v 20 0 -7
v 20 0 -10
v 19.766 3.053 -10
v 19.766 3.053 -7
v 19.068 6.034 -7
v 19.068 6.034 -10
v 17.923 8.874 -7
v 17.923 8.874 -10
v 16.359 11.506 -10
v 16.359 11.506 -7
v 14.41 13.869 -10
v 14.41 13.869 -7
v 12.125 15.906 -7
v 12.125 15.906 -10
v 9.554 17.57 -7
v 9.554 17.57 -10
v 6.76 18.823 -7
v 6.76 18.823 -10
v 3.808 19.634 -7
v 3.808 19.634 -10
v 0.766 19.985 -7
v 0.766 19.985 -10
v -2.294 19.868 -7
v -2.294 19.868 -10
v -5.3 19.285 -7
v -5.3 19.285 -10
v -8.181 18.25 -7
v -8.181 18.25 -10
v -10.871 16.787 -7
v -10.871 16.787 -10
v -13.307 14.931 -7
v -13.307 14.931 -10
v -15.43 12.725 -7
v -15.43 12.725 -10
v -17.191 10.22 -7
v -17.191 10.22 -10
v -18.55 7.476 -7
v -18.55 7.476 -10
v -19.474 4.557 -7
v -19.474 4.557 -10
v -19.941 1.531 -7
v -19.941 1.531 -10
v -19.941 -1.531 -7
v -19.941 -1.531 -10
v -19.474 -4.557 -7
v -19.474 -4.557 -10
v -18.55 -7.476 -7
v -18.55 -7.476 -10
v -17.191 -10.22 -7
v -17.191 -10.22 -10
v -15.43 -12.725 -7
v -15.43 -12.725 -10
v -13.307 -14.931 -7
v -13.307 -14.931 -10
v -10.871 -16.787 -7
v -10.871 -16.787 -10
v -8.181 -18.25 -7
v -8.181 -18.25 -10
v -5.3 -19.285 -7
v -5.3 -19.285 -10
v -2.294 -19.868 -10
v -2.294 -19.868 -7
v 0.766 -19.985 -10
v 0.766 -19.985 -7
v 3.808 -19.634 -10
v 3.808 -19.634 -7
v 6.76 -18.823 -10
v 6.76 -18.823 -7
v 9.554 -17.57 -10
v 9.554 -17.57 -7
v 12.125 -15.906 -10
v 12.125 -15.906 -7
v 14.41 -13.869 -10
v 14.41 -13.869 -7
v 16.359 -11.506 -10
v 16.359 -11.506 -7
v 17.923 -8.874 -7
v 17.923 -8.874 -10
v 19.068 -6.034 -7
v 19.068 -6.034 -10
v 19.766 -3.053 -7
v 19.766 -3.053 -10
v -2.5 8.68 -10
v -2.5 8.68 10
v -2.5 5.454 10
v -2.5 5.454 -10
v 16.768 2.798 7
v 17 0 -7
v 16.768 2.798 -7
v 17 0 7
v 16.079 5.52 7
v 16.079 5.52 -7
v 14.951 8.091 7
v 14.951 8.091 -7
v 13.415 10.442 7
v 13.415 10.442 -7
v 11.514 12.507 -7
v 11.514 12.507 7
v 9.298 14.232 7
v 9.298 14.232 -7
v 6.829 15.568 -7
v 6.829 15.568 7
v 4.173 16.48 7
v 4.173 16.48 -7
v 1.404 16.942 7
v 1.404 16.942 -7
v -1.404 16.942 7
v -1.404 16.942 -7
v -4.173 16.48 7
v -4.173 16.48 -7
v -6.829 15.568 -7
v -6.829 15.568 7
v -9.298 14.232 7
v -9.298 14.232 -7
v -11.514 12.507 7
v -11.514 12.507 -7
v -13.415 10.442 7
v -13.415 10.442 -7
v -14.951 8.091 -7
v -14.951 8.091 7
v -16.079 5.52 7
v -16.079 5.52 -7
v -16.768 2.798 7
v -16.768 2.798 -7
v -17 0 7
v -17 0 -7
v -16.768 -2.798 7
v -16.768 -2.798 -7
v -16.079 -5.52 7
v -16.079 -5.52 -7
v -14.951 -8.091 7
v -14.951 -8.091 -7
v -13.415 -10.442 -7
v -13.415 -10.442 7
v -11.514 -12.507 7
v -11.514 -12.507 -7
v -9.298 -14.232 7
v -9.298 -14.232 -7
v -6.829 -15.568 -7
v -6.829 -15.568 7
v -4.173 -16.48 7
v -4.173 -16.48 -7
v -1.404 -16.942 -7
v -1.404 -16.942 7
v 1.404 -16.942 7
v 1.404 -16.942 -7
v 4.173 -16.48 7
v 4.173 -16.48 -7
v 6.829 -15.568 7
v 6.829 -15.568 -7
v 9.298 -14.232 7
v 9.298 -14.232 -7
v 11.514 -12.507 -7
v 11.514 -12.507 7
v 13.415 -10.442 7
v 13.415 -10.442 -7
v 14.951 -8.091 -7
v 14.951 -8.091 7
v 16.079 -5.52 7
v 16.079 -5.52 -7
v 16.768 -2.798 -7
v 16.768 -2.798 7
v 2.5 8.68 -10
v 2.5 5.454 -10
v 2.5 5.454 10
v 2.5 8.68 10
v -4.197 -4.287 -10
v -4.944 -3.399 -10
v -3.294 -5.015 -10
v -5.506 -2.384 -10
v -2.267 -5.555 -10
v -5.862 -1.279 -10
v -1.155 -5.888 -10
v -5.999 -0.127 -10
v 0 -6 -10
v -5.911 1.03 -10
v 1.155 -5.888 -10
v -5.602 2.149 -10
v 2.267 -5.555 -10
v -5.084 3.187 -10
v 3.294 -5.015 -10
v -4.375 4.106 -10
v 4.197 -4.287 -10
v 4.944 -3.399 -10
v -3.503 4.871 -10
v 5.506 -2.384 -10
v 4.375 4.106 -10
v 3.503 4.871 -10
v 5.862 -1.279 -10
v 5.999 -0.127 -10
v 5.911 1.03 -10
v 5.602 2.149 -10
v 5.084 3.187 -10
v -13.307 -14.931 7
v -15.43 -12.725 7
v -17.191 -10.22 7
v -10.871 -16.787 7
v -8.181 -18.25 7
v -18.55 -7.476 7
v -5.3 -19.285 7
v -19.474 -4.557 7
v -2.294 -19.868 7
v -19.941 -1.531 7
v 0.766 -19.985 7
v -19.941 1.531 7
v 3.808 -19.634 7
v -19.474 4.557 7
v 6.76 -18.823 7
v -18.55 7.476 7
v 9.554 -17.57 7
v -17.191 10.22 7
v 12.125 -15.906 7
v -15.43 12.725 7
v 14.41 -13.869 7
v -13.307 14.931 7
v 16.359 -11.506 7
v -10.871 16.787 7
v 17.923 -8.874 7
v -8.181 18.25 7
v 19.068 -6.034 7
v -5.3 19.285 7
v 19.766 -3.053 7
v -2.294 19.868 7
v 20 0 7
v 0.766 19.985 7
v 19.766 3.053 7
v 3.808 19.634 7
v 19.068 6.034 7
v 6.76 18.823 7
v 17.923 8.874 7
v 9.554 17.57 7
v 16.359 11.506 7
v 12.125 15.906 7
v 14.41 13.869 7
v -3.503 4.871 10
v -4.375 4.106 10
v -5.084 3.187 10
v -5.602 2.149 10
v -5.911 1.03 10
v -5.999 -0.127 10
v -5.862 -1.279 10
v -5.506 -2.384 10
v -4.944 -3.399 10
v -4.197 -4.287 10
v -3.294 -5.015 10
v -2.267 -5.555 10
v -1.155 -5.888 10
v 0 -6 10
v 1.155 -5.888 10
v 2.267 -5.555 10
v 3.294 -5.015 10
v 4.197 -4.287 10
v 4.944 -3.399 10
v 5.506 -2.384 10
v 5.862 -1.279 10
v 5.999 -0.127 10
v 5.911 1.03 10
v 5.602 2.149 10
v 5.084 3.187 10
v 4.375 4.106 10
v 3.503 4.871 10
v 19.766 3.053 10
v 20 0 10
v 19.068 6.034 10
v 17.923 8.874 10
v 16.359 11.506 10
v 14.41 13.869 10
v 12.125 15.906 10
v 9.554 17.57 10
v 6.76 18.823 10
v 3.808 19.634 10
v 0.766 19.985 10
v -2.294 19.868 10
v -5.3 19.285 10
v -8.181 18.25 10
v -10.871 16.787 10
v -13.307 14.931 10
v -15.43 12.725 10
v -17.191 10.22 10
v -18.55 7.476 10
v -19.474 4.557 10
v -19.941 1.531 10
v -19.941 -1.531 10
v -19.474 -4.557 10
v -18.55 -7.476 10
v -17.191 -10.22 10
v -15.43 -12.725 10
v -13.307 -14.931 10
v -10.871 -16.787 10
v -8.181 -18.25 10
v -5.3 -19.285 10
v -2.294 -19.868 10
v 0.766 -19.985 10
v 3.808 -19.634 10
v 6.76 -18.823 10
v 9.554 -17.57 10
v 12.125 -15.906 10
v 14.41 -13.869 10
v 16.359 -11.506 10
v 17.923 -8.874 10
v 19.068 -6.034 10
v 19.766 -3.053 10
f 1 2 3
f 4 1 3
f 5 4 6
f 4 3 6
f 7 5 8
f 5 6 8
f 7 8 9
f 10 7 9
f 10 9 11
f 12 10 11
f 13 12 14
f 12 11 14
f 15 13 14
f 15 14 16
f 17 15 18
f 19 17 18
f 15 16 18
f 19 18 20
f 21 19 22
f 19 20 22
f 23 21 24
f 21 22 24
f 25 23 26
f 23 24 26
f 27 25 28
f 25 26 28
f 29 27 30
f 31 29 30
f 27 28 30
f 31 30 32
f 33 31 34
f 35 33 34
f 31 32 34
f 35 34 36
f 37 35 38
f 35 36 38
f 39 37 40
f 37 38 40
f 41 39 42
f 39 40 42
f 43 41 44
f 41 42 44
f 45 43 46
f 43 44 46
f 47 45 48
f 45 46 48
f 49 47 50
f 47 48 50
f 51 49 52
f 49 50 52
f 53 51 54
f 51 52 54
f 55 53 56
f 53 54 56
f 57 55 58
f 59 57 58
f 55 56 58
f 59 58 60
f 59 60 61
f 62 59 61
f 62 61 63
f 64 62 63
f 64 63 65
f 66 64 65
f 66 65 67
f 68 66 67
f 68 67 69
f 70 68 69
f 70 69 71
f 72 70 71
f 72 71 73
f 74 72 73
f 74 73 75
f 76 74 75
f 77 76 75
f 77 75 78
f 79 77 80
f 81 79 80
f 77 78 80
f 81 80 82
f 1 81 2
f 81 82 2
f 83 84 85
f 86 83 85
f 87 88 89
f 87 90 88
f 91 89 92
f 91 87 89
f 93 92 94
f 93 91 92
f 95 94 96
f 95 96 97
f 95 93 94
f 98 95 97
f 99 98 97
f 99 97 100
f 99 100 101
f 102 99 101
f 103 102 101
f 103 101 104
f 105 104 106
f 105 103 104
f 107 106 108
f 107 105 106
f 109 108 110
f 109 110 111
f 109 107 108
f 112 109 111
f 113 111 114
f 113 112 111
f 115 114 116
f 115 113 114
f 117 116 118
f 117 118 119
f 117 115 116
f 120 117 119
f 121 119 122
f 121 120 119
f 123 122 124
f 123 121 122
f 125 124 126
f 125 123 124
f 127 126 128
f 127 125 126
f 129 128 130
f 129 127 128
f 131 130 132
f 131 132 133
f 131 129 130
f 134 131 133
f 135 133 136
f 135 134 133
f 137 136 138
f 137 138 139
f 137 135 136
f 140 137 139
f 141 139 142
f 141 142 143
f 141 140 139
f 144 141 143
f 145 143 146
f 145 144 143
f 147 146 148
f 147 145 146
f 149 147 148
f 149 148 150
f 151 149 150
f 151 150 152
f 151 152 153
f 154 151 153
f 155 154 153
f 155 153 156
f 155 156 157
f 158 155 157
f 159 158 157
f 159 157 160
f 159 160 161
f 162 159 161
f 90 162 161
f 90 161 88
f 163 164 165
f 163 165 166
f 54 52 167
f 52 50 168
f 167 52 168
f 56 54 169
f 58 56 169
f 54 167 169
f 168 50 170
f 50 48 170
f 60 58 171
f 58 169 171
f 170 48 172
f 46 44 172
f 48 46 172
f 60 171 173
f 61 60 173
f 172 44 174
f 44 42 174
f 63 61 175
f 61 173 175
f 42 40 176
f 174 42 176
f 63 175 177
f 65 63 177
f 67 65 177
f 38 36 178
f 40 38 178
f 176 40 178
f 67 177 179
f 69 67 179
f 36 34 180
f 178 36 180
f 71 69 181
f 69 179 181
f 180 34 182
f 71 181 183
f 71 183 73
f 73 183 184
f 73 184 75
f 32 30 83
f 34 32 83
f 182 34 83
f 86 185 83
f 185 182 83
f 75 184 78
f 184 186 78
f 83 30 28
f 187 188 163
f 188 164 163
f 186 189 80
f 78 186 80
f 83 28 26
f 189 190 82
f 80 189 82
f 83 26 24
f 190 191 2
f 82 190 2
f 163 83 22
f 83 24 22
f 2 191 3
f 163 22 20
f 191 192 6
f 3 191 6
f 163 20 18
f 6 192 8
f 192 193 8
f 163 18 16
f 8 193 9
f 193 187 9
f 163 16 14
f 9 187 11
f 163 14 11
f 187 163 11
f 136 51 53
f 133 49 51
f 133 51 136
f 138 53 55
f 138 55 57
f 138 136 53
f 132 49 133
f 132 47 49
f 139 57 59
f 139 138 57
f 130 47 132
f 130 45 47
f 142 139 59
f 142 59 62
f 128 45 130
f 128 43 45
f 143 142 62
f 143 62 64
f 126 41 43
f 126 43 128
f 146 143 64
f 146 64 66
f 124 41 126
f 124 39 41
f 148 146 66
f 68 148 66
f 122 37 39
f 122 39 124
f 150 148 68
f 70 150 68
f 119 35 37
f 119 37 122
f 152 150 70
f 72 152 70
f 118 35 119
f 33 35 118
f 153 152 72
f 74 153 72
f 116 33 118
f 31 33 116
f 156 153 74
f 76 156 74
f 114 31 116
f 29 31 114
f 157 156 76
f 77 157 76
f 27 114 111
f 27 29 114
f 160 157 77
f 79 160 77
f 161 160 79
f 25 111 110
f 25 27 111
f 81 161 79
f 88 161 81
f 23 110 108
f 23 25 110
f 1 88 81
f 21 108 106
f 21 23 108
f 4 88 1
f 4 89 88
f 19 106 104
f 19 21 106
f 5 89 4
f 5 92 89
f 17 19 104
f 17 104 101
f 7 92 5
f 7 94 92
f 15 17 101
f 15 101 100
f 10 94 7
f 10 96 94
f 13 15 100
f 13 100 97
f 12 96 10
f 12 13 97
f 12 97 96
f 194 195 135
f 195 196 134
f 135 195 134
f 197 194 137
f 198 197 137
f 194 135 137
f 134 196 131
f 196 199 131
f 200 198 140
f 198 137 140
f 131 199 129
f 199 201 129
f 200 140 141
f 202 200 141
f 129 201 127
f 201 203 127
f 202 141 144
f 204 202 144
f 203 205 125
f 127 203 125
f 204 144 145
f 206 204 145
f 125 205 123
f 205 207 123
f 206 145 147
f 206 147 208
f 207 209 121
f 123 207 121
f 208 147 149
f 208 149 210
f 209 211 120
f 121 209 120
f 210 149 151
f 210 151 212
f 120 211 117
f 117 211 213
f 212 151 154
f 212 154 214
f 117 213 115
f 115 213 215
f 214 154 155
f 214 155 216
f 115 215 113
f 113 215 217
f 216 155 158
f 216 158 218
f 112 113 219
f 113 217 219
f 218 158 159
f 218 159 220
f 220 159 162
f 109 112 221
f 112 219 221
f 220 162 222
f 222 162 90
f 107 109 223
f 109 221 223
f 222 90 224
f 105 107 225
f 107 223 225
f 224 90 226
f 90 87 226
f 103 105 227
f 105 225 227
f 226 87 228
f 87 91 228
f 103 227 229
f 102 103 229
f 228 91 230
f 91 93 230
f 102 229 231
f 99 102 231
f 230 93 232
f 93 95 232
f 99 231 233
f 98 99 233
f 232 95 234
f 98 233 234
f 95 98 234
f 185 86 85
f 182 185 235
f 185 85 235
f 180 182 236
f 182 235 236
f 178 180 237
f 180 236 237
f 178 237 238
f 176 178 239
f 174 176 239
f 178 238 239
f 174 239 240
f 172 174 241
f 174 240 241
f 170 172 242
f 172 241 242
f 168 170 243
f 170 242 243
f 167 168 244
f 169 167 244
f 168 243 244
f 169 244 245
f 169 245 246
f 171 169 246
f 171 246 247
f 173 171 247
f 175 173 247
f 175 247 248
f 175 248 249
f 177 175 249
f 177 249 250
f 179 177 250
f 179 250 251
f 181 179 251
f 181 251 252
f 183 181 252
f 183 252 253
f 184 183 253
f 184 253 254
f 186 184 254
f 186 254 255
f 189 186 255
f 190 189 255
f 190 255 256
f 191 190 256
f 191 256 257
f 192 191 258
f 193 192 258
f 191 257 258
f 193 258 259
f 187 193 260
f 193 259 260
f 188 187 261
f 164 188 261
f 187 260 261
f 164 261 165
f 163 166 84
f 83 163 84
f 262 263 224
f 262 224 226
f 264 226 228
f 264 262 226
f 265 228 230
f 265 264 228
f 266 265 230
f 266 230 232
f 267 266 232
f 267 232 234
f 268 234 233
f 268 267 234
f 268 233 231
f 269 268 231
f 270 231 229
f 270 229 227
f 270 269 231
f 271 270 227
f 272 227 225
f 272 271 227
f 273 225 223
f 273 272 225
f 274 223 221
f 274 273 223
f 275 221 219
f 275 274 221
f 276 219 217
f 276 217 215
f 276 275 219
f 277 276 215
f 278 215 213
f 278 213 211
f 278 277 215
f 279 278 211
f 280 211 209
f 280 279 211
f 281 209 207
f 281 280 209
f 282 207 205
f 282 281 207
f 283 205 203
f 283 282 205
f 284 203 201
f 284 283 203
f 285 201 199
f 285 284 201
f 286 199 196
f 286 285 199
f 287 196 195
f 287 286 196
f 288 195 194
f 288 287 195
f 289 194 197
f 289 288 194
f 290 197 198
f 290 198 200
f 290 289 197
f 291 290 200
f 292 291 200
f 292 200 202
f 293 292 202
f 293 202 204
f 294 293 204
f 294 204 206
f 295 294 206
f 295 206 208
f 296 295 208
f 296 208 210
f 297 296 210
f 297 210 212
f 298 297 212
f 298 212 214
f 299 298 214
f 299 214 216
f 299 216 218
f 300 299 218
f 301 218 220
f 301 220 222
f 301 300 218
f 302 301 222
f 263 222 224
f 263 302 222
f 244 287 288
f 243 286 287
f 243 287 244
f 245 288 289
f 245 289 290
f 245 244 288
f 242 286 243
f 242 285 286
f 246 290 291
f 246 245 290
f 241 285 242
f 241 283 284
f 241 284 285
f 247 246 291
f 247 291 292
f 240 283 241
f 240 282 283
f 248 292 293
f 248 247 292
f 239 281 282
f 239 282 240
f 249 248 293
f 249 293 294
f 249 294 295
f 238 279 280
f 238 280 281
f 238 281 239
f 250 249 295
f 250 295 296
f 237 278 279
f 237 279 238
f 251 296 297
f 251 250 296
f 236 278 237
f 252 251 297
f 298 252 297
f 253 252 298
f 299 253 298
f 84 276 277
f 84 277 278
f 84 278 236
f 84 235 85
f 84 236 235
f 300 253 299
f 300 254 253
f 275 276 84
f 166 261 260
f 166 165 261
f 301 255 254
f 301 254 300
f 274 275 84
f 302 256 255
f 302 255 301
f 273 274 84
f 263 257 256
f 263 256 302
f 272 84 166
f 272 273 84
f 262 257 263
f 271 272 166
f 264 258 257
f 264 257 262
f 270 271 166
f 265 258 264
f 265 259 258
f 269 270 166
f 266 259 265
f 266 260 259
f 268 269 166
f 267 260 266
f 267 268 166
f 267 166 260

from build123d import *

# Parameters (mm, degrees)
SKETCH_1_R          = 17
EXTRUDE_1_DEPTH     = 10
SKETCH_2_R          = 20
EXTRUDE_2_DEPTH     = 3
CUT_EXTRUDE_1_DEPTH = 35.641016151


with BuildPart() as part:
    # 草图1 → 凸台-拉伸1 (new, symmetric)
    with BuildSketch(Plane.XY):
        Circle(SKETCH_1_R)
    extrude(amount=EXTRUDE_1_DEPTH, both=True)

    # 草图2 → 凸台-拉伸2 (add)
    with BuildSketch(Plane.XY.offset(10)):
        Circle(SKETCH_2_R)
    extrude_2 = extrude(amount=-EXTRUDE_2_DEPTH)

    # 镜向1: 凸台-拉伸2 across plane
    add(extrude_2.mirror(Plane.XY))

    # 草图3 → 切除-拉伸1 (cut, through all)
    with BuildSketch(Plane.XY.offset(10)):
        with BuildLine():
            Line((2.5, 8.68), (-2.5, 8.68))
            Line((-2.5, 8.68), (-2.5, 5.454356057))
            ThreePointArc((-2.5, 5.454356057), (0, -6), (2.5, 5.454356057))
            Line((2.5, 5.454356057), (2.5, 8.68))
        make_face()
    extrude(amount=-CUT_EXTRUDE_1_DEPTH, mode=Mode.SUBTRACT)


solid = part.part
